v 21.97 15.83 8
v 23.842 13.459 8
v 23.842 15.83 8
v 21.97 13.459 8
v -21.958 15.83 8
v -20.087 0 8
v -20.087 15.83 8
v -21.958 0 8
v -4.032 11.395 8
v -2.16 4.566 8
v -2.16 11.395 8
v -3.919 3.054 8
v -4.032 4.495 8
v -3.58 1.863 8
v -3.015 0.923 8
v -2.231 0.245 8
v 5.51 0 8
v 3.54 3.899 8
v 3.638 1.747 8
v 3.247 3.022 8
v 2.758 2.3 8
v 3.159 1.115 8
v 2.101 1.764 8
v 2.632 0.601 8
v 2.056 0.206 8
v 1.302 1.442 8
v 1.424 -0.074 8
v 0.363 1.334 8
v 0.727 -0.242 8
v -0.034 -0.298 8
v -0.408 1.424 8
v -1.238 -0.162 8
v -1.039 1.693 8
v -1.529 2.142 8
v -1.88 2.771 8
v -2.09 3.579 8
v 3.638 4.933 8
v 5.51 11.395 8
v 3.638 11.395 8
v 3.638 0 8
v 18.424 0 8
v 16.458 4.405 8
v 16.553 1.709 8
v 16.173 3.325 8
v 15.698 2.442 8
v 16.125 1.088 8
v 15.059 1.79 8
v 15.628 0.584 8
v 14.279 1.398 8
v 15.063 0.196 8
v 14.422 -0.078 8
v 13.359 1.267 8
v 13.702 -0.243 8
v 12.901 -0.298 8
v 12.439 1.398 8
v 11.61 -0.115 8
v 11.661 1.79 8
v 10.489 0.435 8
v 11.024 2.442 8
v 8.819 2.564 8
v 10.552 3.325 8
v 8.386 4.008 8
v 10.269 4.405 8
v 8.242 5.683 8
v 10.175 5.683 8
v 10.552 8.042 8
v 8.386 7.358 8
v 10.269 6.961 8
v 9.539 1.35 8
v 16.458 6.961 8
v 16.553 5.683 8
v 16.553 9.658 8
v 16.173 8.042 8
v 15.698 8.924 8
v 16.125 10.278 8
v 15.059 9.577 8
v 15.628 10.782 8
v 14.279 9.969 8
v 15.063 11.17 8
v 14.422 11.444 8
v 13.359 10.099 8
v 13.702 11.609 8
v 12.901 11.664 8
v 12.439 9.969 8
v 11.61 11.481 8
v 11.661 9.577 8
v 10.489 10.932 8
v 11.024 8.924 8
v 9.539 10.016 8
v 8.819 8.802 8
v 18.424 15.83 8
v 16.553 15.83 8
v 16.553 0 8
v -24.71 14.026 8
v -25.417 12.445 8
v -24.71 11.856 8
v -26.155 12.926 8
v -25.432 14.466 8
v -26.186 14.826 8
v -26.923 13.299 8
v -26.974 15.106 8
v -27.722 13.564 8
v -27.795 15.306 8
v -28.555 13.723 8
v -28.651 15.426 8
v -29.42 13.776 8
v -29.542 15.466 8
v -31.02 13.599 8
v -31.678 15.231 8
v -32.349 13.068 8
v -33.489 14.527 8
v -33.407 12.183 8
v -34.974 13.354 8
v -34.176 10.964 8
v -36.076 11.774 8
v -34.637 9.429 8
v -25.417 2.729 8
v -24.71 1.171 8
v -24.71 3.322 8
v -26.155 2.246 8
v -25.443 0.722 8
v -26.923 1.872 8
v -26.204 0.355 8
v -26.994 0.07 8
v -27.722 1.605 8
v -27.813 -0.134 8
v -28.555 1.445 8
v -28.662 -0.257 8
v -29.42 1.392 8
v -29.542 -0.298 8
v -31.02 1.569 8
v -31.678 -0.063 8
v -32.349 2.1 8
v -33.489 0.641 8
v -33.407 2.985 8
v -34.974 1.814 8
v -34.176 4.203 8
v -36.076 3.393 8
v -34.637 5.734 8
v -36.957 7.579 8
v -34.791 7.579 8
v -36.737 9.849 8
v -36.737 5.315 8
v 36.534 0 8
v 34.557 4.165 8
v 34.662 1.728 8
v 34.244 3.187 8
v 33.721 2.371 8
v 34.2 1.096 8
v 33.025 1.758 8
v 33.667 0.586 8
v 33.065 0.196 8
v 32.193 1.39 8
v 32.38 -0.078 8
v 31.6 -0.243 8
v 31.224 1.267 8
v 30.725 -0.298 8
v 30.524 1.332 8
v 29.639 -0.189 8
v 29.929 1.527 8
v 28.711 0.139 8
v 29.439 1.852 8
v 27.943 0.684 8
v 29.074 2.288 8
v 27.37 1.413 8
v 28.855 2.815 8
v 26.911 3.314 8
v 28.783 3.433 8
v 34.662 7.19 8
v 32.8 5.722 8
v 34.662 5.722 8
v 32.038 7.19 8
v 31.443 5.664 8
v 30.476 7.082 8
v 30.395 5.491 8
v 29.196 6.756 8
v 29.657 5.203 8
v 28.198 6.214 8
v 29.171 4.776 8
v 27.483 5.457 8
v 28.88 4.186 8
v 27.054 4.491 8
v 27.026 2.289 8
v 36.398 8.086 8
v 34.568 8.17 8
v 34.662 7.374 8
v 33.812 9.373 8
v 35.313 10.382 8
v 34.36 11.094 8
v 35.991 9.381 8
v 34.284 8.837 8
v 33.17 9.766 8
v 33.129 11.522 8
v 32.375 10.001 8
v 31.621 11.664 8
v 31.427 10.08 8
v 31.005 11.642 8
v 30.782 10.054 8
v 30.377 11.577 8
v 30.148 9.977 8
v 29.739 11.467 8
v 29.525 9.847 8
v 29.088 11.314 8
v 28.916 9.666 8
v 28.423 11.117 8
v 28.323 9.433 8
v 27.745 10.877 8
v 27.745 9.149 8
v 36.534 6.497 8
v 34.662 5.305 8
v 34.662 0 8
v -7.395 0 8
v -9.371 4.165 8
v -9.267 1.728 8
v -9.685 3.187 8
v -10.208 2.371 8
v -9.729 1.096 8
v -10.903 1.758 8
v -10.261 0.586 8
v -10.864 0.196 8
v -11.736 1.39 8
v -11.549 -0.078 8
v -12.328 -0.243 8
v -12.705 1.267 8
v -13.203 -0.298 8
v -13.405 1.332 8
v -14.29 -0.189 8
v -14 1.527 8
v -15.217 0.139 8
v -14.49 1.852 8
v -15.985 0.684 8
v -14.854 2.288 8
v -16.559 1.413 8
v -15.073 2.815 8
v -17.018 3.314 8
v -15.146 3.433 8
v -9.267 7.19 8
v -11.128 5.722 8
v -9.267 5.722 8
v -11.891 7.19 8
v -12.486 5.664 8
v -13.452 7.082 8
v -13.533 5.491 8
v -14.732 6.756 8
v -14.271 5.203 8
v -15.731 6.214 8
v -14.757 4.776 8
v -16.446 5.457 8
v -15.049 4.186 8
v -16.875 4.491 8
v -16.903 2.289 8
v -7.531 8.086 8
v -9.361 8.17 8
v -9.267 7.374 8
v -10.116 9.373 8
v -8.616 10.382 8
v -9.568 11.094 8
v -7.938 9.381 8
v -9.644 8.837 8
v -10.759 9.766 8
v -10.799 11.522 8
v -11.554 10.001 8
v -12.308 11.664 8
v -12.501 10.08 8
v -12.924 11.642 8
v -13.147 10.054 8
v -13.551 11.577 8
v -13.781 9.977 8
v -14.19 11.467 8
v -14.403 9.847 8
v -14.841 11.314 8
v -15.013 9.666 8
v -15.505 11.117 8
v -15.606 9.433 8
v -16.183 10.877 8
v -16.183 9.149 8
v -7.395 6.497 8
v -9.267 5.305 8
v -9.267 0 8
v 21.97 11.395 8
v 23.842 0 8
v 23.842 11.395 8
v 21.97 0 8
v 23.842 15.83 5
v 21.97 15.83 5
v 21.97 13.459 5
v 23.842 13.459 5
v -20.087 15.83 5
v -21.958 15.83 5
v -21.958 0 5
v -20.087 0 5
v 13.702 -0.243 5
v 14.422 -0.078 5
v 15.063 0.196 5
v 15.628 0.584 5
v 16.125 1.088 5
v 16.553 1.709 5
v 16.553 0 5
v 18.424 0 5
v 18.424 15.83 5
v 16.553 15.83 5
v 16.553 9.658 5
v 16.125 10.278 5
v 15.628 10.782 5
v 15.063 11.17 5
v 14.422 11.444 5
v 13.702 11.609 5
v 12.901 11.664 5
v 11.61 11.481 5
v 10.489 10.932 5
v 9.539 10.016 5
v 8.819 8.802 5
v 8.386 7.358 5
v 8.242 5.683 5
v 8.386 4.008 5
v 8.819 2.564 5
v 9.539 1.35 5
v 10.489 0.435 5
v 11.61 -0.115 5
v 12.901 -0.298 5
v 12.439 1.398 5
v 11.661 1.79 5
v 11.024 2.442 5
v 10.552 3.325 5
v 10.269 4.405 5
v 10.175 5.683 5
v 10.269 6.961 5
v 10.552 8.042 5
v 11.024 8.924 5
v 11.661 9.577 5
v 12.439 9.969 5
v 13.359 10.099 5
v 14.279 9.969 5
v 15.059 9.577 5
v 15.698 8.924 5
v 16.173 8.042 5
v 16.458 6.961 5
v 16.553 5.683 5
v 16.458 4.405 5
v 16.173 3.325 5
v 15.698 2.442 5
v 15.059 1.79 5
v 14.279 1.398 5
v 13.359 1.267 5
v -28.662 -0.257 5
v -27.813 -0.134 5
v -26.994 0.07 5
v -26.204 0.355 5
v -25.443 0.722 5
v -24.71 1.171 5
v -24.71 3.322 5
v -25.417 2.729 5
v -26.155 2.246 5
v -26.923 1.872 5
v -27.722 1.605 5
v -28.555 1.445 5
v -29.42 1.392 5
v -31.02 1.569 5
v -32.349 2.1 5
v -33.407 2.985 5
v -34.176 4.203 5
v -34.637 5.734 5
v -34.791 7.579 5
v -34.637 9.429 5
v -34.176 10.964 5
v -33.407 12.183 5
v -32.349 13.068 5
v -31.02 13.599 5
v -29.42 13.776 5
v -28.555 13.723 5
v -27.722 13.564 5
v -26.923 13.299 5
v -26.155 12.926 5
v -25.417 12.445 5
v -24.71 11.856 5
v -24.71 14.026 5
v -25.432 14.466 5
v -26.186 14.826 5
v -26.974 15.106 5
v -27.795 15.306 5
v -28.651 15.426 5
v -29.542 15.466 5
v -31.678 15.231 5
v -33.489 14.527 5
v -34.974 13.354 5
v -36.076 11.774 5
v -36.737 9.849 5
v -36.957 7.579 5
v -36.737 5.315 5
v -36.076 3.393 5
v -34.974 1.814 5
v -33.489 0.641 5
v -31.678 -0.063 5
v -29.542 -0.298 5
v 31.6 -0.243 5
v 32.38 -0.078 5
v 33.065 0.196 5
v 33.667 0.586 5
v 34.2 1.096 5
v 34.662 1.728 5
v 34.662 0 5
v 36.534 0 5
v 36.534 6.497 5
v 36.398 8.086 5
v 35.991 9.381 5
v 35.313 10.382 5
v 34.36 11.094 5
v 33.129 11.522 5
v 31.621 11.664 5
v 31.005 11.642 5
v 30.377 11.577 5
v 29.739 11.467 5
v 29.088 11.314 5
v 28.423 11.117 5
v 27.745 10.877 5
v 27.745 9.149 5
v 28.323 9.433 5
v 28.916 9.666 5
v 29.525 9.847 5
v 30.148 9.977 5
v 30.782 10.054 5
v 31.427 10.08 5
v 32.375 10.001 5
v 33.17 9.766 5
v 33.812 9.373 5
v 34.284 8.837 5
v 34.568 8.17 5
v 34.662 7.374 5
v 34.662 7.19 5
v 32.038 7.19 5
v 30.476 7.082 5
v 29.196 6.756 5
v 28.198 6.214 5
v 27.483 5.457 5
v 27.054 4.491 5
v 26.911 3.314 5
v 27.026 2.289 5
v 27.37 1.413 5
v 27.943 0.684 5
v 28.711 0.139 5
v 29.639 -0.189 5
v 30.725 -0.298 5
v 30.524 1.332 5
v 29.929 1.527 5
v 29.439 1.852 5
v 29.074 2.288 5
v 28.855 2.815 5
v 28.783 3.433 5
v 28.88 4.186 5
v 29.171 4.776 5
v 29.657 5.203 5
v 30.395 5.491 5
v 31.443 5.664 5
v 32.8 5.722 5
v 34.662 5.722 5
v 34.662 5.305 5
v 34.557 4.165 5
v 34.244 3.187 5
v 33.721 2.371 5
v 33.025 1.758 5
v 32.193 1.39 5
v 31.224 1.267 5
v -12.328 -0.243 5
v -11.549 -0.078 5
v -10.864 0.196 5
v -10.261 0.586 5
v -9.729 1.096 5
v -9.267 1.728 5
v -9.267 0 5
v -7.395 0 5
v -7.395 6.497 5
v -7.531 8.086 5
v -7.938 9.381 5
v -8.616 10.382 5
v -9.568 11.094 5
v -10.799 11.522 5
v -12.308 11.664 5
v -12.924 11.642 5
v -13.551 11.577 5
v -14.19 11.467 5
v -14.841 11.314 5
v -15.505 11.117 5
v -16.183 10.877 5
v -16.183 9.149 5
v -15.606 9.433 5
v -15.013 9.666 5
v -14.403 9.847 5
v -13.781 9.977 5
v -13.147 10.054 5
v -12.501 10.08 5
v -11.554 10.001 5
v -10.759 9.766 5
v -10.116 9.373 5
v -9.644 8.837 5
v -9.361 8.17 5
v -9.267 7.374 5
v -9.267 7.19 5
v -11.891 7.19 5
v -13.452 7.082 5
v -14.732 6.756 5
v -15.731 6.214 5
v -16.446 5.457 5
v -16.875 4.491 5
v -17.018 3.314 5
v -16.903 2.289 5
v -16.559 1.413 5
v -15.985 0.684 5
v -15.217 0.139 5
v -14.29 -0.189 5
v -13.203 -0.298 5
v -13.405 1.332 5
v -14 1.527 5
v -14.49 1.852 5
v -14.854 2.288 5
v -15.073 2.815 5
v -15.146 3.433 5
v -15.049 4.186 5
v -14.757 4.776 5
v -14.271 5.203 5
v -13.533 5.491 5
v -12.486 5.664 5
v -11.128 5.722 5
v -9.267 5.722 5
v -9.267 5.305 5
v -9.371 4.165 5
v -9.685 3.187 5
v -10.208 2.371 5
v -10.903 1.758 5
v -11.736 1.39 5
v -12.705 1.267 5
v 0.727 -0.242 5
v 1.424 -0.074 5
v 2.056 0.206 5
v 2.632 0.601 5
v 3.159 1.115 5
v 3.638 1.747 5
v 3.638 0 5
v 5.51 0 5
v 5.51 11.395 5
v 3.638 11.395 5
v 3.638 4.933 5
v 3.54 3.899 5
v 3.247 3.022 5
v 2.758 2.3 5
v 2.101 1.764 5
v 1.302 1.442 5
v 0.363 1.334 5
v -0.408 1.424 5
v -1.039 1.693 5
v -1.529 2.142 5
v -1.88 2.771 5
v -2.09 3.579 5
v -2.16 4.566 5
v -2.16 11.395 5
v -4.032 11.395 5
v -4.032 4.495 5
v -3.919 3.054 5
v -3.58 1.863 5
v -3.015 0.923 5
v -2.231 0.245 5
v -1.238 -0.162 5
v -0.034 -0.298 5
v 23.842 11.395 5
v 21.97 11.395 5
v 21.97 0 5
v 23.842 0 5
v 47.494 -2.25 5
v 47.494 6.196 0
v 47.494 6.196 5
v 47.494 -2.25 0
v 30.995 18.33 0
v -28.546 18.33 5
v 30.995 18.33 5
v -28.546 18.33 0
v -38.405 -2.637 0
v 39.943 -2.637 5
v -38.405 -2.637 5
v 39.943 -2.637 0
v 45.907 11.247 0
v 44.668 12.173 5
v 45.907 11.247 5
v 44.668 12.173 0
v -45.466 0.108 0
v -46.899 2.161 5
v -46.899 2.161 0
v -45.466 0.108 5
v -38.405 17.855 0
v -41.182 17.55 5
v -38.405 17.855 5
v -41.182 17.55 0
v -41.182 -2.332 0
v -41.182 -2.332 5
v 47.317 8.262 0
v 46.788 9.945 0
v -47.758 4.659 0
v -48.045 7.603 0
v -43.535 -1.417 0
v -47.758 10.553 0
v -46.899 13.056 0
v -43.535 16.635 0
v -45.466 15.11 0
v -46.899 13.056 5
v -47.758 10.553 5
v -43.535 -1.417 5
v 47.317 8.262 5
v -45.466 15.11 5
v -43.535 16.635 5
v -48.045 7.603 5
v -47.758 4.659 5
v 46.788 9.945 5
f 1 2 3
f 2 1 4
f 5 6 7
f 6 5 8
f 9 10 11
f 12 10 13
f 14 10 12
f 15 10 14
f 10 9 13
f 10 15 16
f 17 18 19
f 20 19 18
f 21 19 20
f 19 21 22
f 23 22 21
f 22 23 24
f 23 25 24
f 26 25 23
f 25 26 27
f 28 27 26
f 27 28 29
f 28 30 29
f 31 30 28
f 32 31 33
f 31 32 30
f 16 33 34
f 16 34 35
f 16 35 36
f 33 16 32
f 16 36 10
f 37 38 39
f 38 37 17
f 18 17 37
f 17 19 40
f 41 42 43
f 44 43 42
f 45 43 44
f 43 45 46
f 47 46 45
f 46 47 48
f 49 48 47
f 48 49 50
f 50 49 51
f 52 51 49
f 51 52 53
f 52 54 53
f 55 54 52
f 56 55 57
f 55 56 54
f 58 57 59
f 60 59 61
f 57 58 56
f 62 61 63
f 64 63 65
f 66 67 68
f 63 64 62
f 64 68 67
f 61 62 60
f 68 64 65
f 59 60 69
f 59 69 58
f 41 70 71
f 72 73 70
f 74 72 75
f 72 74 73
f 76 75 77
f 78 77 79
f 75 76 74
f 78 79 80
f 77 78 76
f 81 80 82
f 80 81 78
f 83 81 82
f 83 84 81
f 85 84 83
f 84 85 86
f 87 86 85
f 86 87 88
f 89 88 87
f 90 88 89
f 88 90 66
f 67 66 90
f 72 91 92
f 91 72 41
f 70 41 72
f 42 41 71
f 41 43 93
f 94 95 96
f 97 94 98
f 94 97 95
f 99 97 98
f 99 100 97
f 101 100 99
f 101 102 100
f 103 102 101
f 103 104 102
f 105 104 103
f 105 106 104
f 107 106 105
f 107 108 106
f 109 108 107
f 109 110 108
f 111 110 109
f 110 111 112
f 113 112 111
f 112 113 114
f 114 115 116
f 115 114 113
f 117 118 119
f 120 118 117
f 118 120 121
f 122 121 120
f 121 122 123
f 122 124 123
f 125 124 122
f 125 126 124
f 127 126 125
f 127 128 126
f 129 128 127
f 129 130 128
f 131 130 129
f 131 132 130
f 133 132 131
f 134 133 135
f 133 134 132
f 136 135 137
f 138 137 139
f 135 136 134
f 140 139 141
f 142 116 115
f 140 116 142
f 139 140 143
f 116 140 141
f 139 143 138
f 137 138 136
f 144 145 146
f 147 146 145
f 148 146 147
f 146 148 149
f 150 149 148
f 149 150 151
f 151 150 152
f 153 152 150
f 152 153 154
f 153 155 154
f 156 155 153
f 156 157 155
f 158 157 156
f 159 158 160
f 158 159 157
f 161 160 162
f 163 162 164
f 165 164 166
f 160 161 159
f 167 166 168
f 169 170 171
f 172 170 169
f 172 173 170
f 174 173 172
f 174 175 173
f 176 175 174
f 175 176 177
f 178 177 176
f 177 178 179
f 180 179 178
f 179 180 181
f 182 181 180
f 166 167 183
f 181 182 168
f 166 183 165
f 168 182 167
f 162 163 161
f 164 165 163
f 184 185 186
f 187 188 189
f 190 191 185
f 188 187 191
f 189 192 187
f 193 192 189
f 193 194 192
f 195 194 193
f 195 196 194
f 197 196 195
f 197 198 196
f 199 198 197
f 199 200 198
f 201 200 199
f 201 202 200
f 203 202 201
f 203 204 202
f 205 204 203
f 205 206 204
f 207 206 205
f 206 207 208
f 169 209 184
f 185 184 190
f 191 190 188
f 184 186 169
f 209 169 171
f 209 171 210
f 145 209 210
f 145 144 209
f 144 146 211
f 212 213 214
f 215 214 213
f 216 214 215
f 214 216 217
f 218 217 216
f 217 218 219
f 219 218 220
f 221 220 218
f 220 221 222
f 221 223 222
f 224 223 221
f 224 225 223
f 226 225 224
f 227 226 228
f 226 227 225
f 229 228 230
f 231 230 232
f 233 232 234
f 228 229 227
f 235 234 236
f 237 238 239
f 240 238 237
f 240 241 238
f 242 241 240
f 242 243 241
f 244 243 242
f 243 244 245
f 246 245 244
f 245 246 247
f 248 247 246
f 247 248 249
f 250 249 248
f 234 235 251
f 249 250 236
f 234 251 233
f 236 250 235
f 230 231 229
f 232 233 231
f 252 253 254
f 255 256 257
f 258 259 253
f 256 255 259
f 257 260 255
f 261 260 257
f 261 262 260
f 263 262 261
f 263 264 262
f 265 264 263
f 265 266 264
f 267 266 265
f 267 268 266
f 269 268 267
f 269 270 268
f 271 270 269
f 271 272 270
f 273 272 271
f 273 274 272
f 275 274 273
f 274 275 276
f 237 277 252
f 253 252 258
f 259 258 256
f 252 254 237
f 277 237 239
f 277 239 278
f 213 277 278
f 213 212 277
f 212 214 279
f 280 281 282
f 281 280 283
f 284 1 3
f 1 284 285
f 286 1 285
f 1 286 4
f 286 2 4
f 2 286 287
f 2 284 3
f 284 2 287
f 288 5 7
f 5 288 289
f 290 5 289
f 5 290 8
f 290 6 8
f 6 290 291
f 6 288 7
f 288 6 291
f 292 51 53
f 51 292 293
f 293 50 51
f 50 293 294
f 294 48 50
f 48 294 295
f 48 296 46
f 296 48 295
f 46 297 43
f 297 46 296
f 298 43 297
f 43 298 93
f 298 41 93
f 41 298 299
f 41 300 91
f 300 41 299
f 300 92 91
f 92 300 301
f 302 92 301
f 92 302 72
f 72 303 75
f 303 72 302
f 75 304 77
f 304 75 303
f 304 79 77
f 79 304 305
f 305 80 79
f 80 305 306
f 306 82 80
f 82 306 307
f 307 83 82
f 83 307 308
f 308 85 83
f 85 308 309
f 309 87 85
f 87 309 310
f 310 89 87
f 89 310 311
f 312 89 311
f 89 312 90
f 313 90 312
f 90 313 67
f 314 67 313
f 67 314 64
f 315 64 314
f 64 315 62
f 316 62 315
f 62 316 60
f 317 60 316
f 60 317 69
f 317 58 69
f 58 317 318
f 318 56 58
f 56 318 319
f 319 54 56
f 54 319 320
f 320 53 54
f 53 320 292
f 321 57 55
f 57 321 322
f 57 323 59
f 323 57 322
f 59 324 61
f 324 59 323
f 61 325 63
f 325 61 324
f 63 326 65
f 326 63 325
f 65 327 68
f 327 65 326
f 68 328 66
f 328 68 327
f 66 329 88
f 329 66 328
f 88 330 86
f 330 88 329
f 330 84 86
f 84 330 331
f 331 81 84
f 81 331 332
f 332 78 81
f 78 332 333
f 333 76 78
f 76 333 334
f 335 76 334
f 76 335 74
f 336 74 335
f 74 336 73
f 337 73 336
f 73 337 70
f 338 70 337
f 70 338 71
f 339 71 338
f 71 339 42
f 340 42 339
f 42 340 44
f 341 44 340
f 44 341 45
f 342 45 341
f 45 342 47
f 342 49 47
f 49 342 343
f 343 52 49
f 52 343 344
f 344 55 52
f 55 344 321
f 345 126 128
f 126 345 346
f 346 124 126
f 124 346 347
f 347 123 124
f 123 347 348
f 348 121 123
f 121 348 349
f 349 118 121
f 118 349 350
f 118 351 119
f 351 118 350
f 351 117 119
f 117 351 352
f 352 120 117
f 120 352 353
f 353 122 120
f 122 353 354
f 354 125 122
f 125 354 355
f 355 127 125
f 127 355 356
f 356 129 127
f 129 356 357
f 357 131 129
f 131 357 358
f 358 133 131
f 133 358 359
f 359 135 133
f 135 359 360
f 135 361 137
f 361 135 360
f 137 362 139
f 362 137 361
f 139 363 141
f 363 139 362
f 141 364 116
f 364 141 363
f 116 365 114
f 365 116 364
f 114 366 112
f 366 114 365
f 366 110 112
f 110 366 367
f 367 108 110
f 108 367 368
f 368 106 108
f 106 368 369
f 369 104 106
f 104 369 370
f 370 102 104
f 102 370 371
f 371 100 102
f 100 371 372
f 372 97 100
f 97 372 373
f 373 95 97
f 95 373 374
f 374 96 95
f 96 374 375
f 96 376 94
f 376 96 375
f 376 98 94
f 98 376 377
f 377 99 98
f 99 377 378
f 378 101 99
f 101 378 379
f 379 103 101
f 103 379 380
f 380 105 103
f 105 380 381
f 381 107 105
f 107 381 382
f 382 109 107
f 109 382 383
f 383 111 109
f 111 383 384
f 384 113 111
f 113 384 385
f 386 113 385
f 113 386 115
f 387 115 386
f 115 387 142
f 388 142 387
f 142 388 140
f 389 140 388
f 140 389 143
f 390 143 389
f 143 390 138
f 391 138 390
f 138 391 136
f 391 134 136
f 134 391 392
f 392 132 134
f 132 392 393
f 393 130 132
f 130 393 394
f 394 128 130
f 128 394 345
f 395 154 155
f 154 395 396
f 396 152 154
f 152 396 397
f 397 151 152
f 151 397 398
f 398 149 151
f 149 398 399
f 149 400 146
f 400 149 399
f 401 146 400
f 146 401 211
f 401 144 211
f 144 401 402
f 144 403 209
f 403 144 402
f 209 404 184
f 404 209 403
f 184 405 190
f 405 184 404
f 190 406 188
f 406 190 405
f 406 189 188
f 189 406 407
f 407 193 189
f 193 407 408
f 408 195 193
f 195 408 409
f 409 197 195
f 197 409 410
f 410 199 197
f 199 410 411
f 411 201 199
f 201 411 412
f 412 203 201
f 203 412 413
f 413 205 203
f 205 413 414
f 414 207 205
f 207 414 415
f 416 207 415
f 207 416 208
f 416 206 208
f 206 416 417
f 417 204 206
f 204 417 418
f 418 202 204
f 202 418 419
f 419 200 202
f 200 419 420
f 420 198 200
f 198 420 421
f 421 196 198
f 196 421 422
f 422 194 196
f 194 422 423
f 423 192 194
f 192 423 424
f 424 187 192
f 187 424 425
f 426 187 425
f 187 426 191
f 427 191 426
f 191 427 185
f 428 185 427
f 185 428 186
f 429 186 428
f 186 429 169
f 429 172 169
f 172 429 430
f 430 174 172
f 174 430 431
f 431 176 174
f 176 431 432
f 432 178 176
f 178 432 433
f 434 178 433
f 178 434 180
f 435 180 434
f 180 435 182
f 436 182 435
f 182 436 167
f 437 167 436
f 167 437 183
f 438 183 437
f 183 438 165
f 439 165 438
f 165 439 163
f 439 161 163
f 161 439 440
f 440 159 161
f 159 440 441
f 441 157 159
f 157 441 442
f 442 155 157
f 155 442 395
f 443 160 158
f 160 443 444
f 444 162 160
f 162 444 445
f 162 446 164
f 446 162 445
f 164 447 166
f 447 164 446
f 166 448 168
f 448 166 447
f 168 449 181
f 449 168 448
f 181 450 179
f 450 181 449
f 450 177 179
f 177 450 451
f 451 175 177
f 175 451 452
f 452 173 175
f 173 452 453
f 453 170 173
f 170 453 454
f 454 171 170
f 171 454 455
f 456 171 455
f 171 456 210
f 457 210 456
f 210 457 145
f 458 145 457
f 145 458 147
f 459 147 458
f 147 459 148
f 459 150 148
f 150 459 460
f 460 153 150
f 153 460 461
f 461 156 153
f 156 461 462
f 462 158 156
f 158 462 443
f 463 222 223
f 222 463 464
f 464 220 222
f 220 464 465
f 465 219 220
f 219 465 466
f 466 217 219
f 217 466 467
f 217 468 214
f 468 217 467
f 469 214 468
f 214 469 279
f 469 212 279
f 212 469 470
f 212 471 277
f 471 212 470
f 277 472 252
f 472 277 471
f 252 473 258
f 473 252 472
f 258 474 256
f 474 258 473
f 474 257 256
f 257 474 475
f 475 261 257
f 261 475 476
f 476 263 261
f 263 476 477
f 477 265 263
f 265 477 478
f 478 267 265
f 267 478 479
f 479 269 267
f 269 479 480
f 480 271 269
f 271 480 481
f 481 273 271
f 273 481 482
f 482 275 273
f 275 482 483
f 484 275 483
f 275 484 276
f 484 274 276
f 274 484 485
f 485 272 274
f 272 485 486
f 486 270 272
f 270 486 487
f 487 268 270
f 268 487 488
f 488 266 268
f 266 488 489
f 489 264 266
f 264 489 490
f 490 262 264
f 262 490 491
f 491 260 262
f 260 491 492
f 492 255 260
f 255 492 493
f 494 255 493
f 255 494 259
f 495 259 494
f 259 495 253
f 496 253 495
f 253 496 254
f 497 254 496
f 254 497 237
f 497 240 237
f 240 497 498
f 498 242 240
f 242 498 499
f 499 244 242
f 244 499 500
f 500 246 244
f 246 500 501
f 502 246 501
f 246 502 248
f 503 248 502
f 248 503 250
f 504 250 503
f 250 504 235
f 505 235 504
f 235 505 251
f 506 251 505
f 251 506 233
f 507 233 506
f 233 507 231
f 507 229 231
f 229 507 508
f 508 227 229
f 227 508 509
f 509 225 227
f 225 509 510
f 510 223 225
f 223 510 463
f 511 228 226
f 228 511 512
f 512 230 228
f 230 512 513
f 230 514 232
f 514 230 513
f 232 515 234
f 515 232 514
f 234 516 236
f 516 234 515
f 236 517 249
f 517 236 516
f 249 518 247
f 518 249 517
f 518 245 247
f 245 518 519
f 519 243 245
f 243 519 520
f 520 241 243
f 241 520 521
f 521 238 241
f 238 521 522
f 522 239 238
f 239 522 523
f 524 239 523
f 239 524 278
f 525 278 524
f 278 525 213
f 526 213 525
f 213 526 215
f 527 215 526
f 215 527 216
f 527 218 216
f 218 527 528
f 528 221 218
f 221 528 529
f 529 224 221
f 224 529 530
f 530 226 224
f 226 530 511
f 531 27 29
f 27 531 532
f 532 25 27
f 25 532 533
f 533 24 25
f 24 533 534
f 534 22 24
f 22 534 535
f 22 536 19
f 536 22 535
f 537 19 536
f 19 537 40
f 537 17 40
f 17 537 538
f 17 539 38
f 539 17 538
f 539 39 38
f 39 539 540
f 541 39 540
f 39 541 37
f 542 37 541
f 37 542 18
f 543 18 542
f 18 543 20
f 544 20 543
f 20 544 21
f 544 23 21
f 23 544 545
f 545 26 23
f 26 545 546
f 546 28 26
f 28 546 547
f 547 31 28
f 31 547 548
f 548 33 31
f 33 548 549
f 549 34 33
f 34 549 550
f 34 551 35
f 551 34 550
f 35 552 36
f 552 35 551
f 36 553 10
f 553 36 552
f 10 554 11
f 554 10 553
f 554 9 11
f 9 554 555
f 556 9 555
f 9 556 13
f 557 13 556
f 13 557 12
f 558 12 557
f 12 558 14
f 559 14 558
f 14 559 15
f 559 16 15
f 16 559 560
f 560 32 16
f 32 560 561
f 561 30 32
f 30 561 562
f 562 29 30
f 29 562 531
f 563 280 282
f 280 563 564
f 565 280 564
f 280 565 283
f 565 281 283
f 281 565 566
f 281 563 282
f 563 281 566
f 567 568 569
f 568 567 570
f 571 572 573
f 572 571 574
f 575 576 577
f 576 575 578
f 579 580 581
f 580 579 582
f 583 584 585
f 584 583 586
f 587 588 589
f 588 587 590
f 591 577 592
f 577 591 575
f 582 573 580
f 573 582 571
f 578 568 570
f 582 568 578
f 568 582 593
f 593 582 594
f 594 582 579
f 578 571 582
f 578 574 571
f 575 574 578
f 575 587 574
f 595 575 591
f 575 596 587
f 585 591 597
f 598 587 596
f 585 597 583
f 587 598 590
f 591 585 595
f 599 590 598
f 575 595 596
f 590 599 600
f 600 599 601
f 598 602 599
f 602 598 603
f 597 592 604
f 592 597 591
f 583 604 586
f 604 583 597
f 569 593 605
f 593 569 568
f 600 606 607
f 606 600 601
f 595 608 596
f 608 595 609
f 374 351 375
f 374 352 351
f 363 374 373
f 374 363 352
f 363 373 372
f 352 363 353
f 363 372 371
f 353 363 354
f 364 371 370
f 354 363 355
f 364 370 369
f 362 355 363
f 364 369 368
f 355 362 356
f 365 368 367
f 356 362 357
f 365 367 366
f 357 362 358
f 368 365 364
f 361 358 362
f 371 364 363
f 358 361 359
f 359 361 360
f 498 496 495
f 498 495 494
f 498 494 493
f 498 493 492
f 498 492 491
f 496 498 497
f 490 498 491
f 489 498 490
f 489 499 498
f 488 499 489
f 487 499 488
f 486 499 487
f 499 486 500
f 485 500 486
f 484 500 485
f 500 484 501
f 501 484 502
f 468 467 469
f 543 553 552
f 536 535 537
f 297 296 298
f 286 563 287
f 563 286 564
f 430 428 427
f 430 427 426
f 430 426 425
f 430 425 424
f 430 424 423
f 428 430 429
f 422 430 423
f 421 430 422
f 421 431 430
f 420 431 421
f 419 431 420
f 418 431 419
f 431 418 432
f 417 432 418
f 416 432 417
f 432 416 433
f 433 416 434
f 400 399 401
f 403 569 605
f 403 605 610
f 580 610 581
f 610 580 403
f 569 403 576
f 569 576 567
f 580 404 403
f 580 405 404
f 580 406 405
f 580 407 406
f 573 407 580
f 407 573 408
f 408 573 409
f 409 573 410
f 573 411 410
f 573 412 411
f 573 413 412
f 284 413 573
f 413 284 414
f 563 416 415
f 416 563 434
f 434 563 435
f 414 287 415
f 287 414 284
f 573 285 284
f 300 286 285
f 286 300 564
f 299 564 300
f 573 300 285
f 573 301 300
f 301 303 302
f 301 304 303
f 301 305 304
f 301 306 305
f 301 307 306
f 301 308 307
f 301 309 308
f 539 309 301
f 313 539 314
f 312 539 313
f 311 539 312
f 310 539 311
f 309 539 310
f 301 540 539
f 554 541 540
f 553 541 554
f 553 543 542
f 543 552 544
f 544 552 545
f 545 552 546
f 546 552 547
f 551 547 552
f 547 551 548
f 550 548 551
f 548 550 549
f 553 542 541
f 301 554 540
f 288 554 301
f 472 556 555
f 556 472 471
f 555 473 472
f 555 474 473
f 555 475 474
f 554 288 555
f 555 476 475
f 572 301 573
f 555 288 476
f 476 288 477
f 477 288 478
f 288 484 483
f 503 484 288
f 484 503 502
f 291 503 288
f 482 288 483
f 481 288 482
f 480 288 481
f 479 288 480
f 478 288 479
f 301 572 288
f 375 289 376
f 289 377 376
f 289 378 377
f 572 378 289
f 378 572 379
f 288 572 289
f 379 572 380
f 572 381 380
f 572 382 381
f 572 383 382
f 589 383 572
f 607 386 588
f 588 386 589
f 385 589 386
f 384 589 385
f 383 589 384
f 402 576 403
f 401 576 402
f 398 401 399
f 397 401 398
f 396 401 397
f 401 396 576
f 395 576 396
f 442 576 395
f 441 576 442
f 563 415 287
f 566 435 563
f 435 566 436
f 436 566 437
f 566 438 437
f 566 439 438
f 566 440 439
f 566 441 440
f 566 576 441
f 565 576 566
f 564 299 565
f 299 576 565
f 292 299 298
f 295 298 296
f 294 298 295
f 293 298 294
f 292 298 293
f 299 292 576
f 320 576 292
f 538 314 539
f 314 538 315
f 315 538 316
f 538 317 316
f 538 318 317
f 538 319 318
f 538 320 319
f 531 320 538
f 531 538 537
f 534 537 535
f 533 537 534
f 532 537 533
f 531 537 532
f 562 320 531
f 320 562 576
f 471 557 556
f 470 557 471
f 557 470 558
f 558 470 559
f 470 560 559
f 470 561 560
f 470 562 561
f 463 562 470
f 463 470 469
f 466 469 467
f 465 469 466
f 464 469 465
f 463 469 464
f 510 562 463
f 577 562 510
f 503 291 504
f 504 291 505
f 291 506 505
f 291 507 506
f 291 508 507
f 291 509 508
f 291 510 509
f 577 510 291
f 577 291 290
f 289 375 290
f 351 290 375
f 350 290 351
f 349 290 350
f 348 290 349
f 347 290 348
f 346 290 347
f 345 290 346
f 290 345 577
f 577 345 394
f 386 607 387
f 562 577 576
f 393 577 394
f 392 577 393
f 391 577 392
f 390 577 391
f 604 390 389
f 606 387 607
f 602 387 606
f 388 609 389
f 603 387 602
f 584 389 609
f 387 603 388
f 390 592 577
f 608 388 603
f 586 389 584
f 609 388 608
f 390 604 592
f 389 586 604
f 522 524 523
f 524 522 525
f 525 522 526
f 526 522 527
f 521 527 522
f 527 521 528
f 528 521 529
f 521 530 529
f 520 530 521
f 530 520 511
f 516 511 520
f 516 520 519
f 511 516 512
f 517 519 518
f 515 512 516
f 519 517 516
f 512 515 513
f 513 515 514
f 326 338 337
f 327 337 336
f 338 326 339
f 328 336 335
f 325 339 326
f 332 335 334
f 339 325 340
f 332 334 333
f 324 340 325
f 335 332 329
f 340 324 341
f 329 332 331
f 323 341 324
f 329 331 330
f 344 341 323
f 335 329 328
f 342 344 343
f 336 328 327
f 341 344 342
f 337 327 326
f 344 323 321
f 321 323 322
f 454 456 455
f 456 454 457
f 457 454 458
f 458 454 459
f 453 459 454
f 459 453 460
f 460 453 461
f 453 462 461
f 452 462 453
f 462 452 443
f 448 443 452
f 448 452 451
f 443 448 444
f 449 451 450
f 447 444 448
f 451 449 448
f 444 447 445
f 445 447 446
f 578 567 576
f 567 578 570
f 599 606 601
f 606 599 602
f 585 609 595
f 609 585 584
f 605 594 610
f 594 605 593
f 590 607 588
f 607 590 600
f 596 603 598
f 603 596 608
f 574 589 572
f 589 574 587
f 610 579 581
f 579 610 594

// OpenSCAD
nombre="Claudia";

module iman(texto = nombre ,fuente = "Ubuntu",tam = 15){
    translate([0,0,3])
    linear_extrude(height=5)
    text(texto, size =tam,halign="center",font=fuente, $fn=20); 
    translate([0,-tam*0.15,0])
    hull(){
        linear_extrude(height=5)
        text(texto, size =tam*1.3,halign="center",font=fuente, $fn=20);
    }
    
}

iman();
